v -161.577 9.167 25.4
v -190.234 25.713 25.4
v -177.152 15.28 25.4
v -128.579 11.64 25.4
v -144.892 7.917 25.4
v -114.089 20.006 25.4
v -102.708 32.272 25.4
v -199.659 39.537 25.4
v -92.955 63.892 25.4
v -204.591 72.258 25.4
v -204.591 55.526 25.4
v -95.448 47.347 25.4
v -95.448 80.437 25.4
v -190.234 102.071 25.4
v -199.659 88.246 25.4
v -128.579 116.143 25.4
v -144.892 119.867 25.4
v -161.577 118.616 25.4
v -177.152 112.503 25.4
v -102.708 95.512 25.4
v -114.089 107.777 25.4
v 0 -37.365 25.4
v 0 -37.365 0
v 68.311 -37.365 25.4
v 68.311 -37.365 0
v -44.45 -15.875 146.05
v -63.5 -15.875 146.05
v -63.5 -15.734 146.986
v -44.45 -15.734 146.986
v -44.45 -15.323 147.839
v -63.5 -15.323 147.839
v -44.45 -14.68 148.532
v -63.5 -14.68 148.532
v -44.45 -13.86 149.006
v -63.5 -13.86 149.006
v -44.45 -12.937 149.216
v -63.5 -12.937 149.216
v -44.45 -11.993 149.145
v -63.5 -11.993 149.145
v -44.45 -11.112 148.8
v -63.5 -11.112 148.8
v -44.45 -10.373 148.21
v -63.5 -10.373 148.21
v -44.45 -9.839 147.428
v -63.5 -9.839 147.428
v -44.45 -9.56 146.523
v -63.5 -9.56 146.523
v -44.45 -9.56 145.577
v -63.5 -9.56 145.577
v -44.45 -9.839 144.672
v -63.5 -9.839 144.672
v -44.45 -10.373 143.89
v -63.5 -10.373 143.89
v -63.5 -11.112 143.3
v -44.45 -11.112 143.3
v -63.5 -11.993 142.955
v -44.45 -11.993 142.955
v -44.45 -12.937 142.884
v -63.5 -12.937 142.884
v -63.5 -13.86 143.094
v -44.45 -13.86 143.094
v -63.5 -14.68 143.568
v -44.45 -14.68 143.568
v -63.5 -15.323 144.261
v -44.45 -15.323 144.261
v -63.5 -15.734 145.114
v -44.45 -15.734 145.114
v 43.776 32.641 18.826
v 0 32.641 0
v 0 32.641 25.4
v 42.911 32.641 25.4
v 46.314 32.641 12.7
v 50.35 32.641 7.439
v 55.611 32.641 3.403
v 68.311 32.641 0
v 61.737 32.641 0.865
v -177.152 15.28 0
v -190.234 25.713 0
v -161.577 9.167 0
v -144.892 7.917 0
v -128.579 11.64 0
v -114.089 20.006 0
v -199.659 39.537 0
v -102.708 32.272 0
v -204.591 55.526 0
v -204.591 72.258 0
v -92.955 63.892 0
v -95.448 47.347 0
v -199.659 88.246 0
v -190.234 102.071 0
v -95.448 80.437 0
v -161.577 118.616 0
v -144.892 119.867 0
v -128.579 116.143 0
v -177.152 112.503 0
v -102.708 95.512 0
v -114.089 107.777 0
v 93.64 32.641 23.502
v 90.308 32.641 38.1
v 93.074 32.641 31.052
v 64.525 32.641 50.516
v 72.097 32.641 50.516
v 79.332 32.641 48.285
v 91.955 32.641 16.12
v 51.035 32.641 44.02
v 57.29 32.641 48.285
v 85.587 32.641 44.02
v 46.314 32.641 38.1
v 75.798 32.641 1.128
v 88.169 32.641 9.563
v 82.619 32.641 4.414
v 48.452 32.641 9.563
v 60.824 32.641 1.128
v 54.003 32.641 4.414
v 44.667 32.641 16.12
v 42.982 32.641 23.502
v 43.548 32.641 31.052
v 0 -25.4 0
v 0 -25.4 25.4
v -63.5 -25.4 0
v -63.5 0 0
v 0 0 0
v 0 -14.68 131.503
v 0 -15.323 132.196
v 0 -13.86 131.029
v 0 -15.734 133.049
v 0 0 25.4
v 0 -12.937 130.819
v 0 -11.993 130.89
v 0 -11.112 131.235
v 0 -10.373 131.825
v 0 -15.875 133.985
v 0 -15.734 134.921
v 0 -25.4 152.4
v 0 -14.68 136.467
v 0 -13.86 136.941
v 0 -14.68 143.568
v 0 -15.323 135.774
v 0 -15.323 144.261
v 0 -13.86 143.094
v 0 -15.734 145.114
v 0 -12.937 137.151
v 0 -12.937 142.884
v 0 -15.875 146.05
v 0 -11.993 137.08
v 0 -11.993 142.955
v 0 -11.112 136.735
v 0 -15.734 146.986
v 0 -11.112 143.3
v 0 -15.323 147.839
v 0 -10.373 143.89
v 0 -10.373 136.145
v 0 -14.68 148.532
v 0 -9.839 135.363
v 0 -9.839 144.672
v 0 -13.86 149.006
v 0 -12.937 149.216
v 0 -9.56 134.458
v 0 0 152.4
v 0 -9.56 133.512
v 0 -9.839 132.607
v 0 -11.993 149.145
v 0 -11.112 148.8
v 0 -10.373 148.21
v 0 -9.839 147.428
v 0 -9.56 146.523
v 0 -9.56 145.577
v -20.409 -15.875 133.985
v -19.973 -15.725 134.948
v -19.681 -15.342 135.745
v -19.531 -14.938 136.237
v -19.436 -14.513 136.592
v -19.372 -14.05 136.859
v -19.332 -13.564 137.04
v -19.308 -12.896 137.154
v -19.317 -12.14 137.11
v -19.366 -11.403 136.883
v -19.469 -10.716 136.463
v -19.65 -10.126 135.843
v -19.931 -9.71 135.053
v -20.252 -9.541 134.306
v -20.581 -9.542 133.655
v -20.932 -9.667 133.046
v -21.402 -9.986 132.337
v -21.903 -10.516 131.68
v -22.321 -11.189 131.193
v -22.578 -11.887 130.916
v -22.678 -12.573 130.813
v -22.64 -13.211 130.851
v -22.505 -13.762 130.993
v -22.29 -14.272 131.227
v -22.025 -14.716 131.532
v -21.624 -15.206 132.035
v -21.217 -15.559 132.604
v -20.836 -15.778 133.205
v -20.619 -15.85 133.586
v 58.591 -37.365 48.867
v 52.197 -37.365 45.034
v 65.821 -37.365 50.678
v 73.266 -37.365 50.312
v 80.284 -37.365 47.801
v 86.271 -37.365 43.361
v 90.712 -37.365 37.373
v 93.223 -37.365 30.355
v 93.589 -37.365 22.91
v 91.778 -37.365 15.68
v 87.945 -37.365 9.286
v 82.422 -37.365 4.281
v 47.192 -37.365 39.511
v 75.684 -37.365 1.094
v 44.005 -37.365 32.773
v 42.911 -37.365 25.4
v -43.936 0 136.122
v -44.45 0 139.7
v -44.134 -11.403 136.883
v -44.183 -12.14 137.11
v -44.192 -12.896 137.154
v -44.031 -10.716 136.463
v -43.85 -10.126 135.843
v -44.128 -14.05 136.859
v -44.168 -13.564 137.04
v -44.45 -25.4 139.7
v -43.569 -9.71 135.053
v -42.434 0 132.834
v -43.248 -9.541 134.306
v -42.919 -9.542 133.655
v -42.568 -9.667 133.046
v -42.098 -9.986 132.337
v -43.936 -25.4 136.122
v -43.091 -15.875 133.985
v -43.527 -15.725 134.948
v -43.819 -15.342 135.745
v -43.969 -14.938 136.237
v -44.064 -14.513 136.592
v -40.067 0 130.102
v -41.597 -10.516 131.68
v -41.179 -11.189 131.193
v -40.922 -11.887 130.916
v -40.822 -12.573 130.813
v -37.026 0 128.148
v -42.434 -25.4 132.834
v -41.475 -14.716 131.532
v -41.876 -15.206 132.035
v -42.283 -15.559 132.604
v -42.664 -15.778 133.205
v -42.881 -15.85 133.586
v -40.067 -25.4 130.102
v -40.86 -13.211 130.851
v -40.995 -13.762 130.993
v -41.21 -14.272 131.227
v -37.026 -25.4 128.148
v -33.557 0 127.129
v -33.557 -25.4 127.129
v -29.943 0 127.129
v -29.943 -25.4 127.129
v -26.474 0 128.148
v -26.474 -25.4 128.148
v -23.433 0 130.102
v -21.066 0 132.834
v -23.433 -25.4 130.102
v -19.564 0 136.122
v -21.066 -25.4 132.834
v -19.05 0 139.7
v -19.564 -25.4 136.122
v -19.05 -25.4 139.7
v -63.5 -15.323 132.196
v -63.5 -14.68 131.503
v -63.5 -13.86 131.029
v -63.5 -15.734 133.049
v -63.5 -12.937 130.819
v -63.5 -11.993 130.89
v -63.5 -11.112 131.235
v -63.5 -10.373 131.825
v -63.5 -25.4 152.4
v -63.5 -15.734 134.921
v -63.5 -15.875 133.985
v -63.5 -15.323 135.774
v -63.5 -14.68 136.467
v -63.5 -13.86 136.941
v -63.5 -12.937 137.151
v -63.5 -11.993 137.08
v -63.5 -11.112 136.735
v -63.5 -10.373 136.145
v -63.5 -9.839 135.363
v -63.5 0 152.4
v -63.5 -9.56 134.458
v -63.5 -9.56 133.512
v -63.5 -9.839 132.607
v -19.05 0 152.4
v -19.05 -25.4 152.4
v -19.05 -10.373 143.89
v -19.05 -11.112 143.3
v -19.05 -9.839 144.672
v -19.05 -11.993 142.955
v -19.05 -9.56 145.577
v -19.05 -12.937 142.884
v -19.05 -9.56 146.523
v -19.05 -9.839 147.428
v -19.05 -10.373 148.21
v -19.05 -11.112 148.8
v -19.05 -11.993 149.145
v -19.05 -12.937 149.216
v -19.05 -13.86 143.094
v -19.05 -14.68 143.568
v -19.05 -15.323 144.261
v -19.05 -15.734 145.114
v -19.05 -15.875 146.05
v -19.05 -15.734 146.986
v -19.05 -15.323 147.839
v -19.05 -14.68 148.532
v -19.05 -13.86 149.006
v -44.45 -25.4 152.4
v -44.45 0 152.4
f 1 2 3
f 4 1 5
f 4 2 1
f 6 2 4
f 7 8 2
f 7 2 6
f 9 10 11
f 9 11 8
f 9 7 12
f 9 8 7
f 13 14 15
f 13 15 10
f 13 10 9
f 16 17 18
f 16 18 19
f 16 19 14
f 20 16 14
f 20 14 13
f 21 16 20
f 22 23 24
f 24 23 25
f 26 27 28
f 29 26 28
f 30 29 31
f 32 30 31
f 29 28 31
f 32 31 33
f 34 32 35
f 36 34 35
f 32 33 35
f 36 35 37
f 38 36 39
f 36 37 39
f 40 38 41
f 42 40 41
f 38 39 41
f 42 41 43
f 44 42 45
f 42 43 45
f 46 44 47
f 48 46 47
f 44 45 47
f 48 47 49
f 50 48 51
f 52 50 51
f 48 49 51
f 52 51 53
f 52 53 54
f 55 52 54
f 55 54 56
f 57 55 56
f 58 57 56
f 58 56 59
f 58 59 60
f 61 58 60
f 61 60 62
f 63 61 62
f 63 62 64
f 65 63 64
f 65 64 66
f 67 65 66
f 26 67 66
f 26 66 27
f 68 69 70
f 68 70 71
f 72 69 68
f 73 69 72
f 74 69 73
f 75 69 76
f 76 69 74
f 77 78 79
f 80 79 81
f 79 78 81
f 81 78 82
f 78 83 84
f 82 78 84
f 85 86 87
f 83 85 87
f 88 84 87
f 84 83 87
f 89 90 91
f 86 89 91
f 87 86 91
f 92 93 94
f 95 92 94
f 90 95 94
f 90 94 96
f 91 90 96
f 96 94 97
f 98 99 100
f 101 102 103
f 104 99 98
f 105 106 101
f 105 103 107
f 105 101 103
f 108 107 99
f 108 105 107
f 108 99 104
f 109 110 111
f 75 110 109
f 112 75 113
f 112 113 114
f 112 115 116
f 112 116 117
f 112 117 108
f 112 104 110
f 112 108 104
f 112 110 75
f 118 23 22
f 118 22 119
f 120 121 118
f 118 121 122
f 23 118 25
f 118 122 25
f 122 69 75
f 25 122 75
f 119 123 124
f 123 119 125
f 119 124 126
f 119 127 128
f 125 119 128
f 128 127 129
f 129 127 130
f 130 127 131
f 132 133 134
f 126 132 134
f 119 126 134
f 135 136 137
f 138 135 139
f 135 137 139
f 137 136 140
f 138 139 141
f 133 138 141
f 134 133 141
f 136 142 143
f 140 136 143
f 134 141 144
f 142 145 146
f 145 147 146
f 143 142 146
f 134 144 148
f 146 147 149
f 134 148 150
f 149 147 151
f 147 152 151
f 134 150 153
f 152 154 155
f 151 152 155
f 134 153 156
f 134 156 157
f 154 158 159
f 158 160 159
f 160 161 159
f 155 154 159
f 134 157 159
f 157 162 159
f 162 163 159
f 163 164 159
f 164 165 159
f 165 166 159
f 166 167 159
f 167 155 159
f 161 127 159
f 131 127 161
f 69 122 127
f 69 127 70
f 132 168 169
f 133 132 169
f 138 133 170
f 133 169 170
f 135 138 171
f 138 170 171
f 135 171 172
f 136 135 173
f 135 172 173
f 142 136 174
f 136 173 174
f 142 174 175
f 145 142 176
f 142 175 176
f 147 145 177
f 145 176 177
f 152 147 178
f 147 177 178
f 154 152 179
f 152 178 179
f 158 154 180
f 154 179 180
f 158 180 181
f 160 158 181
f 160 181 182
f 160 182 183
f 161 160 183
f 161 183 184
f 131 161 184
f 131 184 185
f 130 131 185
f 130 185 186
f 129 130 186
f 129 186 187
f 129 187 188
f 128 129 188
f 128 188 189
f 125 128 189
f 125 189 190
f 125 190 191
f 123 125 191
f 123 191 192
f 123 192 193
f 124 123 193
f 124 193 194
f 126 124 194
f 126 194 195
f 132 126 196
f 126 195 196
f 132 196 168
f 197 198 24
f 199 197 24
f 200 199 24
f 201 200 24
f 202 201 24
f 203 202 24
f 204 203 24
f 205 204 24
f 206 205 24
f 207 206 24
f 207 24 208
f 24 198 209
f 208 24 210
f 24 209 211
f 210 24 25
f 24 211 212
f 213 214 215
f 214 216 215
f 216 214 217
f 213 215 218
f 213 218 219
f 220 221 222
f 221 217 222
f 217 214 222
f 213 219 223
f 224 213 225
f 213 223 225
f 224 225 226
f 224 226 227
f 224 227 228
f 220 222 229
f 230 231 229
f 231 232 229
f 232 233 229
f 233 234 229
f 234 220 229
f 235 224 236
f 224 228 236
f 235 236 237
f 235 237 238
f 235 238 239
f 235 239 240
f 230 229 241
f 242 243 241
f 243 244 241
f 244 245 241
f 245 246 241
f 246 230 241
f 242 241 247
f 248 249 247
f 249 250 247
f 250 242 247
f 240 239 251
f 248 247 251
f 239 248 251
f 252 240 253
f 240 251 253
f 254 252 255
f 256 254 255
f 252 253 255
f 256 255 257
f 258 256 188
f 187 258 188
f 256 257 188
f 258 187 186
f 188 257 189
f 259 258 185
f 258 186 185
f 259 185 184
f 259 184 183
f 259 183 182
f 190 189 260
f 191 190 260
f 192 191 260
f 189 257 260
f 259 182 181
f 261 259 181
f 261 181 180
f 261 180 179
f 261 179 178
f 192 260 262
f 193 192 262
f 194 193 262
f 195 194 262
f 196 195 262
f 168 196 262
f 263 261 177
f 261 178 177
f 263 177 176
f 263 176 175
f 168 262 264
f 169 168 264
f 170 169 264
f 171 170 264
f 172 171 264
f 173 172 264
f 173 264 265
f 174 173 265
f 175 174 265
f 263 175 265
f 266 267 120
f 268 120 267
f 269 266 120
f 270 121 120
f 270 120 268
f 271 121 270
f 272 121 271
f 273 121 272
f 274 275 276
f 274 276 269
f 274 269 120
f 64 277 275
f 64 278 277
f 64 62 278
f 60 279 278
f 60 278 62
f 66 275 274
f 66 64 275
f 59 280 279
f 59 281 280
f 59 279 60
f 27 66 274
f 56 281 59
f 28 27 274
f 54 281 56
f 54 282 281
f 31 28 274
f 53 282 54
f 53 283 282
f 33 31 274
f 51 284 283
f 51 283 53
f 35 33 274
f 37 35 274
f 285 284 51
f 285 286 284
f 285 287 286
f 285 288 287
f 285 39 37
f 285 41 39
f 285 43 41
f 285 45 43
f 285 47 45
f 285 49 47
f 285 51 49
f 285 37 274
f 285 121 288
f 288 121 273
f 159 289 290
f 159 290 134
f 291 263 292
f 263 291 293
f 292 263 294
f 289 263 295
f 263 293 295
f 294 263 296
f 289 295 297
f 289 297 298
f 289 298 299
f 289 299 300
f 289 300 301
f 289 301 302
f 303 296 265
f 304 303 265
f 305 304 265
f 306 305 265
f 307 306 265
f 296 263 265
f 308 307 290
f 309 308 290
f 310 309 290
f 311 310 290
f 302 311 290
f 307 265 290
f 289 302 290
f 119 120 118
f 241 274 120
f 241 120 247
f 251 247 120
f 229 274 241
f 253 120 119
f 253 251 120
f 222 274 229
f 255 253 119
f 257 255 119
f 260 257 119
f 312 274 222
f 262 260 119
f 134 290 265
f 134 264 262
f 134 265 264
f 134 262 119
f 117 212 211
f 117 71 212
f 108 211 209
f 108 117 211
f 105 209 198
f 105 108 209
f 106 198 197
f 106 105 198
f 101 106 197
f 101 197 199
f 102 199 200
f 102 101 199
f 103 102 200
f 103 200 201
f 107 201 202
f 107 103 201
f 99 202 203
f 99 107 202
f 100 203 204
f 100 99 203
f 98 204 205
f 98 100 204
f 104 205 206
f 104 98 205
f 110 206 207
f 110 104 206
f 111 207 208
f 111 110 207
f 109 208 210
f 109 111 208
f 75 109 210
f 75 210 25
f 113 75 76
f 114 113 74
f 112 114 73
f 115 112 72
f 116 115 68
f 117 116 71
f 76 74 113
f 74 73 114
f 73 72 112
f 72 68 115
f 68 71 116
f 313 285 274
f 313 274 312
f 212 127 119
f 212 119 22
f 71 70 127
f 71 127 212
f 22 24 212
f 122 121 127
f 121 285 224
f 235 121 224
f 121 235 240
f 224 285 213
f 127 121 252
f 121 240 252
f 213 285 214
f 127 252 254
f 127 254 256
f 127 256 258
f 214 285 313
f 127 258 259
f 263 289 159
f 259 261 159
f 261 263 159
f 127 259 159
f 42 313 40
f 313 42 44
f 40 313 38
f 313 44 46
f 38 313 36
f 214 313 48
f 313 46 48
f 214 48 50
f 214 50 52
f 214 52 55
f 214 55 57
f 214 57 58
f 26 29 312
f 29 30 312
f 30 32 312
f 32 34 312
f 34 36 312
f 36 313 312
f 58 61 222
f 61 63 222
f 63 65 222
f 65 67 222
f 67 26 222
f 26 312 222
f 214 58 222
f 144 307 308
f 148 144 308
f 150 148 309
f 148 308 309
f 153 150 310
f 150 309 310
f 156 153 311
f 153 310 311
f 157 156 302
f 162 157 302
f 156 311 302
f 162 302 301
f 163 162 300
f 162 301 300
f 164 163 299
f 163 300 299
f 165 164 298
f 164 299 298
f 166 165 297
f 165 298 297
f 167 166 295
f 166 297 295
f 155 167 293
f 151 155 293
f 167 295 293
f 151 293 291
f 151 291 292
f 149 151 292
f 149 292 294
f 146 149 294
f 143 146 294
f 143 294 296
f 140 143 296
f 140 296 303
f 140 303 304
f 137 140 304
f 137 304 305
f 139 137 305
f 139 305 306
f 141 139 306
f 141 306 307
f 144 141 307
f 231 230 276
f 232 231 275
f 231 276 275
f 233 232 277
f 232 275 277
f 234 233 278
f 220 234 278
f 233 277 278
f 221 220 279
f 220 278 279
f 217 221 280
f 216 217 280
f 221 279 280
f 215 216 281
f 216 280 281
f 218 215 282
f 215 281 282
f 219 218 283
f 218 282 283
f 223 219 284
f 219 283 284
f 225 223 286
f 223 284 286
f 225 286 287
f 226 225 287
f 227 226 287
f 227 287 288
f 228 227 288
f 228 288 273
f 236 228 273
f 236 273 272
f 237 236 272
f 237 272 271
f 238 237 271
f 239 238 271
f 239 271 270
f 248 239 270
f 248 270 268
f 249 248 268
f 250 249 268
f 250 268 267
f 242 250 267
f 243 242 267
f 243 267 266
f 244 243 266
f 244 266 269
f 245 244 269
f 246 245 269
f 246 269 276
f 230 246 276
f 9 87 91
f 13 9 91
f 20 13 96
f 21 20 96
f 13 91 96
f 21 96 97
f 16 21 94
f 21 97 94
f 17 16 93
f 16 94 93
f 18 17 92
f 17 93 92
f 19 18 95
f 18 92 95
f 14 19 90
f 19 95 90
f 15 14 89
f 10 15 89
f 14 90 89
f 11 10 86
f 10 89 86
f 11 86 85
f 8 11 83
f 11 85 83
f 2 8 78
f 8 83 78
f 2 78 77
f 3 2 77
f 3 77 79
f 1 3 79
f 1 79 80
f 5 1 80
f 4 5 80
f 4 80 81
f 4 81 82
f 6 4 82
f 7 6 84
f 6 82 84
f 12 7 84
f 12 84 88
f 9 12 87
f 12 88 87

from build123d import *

# Parameters (mm, degrees)
F0_W      = 63.5
F0_H      = 152.4
F1_DEPTH  = 25.4
F3_DEPTH  = 25.4
F4_R      = 3.175
F5_DEPTH  = 63.501
F6_W      = 68.310976
F6_H      = 70.006091
F7_DEPTH  = 25.4
F7_FACE_W = 70.006092
F7_FACE_H = 25.4
F9_R      = 56.131763
F10_DEPTH = 25.4


with BuildPart() as f1:
    # F0 (on Front) → F1 (new body)
    with BuildSketch(Plane.XZ):
        with Locations((-31.75, 76.2)):
            Rectangle(F0_W, F0_H)
    extrude(amount=F1_DEPTH)

    # F2 (on face) → F3 (cut)
    with BuildSketch(Plane.XZ.offset(25.4)):
        with BuildLine():
            ThreePointArc((-31.75, 152.4), (-40.730256, 148.680256), (-44.45, 139.7))
            ThreePointArc((-44.45, 139.7), (-31.75, 127), (-19.05, 139.7))
            ThreePointArc((-19.05, 139.7), (-22.769744, 148.680256), (-31.75, 152.4))
        make_face()
        with BuildLine():
            Line((-44.45, 152.4), (-44.45, 139.7))
            ThreePointArc((-44.45, 139.7), (-40.730256, 148.680256), (-31.75, 152.4))
            Line((-31.75, 152.4), (-44.45, 152.4))
        make_face()
        with BuildLine():
            ThreePointArc((-31.75, 152.4), (-22.769744, 148.680256), (-19.05, 139.7))
            Line((-19.05, 139.7), (-19.05, 152.4))
            Line((-19.05, 152.4), (-31.75, 152.4))
        make_face()
    extrude(amount=-F3_DEPTH, mode=Mode.SUBTRACT)

    # F4 (on face) → F5 (cut, through all)
    with BuildSketch(Plane(origin=(-63.5, 0, 0), x_dir=(0, -1, 0), z_dir=(-1, 0, 0))):
        with Locations((12.7, 133.985)):
            Circle(F4_R)
        with Locations((12.7, 146.05)):
            Circle(F4_R)
    extrude(amount=-F5_DEPTH, mode=Mode.SUBTRACT)

    # F6 (on Top) → F7 (join)
    with BuildSketch(Plane.XY):
        with Locations((34.155488, -2.361911)):
            Rectangle(F6_W, F6_H)
    extrude(amount=F7_DEPTH)

    # F7_face (on face) → F8 (revolve)
    with BuildSketch(Plane(origin=(68.310976, -2.36191, 12.7), x_dir=(0, 1, 0), z_dir=(1, 0, 0))):
        Rectangle(F7_FACE_W, F7_FACE_H)
    revolve(axis=Axis((68.310976, -2.36191, 25.4), (0, 1, 0)))


with BuildPart() as f10:
    # F9 (on Top) → F10 (new body)
    with BuildSketch(Plane.XY):
        with Locations((-149.086386, 63.891836)):
            Circle(F9_R)
    extrude(amount=F10_DEPTH)


solid = Compound([f1.part, f10.part])
